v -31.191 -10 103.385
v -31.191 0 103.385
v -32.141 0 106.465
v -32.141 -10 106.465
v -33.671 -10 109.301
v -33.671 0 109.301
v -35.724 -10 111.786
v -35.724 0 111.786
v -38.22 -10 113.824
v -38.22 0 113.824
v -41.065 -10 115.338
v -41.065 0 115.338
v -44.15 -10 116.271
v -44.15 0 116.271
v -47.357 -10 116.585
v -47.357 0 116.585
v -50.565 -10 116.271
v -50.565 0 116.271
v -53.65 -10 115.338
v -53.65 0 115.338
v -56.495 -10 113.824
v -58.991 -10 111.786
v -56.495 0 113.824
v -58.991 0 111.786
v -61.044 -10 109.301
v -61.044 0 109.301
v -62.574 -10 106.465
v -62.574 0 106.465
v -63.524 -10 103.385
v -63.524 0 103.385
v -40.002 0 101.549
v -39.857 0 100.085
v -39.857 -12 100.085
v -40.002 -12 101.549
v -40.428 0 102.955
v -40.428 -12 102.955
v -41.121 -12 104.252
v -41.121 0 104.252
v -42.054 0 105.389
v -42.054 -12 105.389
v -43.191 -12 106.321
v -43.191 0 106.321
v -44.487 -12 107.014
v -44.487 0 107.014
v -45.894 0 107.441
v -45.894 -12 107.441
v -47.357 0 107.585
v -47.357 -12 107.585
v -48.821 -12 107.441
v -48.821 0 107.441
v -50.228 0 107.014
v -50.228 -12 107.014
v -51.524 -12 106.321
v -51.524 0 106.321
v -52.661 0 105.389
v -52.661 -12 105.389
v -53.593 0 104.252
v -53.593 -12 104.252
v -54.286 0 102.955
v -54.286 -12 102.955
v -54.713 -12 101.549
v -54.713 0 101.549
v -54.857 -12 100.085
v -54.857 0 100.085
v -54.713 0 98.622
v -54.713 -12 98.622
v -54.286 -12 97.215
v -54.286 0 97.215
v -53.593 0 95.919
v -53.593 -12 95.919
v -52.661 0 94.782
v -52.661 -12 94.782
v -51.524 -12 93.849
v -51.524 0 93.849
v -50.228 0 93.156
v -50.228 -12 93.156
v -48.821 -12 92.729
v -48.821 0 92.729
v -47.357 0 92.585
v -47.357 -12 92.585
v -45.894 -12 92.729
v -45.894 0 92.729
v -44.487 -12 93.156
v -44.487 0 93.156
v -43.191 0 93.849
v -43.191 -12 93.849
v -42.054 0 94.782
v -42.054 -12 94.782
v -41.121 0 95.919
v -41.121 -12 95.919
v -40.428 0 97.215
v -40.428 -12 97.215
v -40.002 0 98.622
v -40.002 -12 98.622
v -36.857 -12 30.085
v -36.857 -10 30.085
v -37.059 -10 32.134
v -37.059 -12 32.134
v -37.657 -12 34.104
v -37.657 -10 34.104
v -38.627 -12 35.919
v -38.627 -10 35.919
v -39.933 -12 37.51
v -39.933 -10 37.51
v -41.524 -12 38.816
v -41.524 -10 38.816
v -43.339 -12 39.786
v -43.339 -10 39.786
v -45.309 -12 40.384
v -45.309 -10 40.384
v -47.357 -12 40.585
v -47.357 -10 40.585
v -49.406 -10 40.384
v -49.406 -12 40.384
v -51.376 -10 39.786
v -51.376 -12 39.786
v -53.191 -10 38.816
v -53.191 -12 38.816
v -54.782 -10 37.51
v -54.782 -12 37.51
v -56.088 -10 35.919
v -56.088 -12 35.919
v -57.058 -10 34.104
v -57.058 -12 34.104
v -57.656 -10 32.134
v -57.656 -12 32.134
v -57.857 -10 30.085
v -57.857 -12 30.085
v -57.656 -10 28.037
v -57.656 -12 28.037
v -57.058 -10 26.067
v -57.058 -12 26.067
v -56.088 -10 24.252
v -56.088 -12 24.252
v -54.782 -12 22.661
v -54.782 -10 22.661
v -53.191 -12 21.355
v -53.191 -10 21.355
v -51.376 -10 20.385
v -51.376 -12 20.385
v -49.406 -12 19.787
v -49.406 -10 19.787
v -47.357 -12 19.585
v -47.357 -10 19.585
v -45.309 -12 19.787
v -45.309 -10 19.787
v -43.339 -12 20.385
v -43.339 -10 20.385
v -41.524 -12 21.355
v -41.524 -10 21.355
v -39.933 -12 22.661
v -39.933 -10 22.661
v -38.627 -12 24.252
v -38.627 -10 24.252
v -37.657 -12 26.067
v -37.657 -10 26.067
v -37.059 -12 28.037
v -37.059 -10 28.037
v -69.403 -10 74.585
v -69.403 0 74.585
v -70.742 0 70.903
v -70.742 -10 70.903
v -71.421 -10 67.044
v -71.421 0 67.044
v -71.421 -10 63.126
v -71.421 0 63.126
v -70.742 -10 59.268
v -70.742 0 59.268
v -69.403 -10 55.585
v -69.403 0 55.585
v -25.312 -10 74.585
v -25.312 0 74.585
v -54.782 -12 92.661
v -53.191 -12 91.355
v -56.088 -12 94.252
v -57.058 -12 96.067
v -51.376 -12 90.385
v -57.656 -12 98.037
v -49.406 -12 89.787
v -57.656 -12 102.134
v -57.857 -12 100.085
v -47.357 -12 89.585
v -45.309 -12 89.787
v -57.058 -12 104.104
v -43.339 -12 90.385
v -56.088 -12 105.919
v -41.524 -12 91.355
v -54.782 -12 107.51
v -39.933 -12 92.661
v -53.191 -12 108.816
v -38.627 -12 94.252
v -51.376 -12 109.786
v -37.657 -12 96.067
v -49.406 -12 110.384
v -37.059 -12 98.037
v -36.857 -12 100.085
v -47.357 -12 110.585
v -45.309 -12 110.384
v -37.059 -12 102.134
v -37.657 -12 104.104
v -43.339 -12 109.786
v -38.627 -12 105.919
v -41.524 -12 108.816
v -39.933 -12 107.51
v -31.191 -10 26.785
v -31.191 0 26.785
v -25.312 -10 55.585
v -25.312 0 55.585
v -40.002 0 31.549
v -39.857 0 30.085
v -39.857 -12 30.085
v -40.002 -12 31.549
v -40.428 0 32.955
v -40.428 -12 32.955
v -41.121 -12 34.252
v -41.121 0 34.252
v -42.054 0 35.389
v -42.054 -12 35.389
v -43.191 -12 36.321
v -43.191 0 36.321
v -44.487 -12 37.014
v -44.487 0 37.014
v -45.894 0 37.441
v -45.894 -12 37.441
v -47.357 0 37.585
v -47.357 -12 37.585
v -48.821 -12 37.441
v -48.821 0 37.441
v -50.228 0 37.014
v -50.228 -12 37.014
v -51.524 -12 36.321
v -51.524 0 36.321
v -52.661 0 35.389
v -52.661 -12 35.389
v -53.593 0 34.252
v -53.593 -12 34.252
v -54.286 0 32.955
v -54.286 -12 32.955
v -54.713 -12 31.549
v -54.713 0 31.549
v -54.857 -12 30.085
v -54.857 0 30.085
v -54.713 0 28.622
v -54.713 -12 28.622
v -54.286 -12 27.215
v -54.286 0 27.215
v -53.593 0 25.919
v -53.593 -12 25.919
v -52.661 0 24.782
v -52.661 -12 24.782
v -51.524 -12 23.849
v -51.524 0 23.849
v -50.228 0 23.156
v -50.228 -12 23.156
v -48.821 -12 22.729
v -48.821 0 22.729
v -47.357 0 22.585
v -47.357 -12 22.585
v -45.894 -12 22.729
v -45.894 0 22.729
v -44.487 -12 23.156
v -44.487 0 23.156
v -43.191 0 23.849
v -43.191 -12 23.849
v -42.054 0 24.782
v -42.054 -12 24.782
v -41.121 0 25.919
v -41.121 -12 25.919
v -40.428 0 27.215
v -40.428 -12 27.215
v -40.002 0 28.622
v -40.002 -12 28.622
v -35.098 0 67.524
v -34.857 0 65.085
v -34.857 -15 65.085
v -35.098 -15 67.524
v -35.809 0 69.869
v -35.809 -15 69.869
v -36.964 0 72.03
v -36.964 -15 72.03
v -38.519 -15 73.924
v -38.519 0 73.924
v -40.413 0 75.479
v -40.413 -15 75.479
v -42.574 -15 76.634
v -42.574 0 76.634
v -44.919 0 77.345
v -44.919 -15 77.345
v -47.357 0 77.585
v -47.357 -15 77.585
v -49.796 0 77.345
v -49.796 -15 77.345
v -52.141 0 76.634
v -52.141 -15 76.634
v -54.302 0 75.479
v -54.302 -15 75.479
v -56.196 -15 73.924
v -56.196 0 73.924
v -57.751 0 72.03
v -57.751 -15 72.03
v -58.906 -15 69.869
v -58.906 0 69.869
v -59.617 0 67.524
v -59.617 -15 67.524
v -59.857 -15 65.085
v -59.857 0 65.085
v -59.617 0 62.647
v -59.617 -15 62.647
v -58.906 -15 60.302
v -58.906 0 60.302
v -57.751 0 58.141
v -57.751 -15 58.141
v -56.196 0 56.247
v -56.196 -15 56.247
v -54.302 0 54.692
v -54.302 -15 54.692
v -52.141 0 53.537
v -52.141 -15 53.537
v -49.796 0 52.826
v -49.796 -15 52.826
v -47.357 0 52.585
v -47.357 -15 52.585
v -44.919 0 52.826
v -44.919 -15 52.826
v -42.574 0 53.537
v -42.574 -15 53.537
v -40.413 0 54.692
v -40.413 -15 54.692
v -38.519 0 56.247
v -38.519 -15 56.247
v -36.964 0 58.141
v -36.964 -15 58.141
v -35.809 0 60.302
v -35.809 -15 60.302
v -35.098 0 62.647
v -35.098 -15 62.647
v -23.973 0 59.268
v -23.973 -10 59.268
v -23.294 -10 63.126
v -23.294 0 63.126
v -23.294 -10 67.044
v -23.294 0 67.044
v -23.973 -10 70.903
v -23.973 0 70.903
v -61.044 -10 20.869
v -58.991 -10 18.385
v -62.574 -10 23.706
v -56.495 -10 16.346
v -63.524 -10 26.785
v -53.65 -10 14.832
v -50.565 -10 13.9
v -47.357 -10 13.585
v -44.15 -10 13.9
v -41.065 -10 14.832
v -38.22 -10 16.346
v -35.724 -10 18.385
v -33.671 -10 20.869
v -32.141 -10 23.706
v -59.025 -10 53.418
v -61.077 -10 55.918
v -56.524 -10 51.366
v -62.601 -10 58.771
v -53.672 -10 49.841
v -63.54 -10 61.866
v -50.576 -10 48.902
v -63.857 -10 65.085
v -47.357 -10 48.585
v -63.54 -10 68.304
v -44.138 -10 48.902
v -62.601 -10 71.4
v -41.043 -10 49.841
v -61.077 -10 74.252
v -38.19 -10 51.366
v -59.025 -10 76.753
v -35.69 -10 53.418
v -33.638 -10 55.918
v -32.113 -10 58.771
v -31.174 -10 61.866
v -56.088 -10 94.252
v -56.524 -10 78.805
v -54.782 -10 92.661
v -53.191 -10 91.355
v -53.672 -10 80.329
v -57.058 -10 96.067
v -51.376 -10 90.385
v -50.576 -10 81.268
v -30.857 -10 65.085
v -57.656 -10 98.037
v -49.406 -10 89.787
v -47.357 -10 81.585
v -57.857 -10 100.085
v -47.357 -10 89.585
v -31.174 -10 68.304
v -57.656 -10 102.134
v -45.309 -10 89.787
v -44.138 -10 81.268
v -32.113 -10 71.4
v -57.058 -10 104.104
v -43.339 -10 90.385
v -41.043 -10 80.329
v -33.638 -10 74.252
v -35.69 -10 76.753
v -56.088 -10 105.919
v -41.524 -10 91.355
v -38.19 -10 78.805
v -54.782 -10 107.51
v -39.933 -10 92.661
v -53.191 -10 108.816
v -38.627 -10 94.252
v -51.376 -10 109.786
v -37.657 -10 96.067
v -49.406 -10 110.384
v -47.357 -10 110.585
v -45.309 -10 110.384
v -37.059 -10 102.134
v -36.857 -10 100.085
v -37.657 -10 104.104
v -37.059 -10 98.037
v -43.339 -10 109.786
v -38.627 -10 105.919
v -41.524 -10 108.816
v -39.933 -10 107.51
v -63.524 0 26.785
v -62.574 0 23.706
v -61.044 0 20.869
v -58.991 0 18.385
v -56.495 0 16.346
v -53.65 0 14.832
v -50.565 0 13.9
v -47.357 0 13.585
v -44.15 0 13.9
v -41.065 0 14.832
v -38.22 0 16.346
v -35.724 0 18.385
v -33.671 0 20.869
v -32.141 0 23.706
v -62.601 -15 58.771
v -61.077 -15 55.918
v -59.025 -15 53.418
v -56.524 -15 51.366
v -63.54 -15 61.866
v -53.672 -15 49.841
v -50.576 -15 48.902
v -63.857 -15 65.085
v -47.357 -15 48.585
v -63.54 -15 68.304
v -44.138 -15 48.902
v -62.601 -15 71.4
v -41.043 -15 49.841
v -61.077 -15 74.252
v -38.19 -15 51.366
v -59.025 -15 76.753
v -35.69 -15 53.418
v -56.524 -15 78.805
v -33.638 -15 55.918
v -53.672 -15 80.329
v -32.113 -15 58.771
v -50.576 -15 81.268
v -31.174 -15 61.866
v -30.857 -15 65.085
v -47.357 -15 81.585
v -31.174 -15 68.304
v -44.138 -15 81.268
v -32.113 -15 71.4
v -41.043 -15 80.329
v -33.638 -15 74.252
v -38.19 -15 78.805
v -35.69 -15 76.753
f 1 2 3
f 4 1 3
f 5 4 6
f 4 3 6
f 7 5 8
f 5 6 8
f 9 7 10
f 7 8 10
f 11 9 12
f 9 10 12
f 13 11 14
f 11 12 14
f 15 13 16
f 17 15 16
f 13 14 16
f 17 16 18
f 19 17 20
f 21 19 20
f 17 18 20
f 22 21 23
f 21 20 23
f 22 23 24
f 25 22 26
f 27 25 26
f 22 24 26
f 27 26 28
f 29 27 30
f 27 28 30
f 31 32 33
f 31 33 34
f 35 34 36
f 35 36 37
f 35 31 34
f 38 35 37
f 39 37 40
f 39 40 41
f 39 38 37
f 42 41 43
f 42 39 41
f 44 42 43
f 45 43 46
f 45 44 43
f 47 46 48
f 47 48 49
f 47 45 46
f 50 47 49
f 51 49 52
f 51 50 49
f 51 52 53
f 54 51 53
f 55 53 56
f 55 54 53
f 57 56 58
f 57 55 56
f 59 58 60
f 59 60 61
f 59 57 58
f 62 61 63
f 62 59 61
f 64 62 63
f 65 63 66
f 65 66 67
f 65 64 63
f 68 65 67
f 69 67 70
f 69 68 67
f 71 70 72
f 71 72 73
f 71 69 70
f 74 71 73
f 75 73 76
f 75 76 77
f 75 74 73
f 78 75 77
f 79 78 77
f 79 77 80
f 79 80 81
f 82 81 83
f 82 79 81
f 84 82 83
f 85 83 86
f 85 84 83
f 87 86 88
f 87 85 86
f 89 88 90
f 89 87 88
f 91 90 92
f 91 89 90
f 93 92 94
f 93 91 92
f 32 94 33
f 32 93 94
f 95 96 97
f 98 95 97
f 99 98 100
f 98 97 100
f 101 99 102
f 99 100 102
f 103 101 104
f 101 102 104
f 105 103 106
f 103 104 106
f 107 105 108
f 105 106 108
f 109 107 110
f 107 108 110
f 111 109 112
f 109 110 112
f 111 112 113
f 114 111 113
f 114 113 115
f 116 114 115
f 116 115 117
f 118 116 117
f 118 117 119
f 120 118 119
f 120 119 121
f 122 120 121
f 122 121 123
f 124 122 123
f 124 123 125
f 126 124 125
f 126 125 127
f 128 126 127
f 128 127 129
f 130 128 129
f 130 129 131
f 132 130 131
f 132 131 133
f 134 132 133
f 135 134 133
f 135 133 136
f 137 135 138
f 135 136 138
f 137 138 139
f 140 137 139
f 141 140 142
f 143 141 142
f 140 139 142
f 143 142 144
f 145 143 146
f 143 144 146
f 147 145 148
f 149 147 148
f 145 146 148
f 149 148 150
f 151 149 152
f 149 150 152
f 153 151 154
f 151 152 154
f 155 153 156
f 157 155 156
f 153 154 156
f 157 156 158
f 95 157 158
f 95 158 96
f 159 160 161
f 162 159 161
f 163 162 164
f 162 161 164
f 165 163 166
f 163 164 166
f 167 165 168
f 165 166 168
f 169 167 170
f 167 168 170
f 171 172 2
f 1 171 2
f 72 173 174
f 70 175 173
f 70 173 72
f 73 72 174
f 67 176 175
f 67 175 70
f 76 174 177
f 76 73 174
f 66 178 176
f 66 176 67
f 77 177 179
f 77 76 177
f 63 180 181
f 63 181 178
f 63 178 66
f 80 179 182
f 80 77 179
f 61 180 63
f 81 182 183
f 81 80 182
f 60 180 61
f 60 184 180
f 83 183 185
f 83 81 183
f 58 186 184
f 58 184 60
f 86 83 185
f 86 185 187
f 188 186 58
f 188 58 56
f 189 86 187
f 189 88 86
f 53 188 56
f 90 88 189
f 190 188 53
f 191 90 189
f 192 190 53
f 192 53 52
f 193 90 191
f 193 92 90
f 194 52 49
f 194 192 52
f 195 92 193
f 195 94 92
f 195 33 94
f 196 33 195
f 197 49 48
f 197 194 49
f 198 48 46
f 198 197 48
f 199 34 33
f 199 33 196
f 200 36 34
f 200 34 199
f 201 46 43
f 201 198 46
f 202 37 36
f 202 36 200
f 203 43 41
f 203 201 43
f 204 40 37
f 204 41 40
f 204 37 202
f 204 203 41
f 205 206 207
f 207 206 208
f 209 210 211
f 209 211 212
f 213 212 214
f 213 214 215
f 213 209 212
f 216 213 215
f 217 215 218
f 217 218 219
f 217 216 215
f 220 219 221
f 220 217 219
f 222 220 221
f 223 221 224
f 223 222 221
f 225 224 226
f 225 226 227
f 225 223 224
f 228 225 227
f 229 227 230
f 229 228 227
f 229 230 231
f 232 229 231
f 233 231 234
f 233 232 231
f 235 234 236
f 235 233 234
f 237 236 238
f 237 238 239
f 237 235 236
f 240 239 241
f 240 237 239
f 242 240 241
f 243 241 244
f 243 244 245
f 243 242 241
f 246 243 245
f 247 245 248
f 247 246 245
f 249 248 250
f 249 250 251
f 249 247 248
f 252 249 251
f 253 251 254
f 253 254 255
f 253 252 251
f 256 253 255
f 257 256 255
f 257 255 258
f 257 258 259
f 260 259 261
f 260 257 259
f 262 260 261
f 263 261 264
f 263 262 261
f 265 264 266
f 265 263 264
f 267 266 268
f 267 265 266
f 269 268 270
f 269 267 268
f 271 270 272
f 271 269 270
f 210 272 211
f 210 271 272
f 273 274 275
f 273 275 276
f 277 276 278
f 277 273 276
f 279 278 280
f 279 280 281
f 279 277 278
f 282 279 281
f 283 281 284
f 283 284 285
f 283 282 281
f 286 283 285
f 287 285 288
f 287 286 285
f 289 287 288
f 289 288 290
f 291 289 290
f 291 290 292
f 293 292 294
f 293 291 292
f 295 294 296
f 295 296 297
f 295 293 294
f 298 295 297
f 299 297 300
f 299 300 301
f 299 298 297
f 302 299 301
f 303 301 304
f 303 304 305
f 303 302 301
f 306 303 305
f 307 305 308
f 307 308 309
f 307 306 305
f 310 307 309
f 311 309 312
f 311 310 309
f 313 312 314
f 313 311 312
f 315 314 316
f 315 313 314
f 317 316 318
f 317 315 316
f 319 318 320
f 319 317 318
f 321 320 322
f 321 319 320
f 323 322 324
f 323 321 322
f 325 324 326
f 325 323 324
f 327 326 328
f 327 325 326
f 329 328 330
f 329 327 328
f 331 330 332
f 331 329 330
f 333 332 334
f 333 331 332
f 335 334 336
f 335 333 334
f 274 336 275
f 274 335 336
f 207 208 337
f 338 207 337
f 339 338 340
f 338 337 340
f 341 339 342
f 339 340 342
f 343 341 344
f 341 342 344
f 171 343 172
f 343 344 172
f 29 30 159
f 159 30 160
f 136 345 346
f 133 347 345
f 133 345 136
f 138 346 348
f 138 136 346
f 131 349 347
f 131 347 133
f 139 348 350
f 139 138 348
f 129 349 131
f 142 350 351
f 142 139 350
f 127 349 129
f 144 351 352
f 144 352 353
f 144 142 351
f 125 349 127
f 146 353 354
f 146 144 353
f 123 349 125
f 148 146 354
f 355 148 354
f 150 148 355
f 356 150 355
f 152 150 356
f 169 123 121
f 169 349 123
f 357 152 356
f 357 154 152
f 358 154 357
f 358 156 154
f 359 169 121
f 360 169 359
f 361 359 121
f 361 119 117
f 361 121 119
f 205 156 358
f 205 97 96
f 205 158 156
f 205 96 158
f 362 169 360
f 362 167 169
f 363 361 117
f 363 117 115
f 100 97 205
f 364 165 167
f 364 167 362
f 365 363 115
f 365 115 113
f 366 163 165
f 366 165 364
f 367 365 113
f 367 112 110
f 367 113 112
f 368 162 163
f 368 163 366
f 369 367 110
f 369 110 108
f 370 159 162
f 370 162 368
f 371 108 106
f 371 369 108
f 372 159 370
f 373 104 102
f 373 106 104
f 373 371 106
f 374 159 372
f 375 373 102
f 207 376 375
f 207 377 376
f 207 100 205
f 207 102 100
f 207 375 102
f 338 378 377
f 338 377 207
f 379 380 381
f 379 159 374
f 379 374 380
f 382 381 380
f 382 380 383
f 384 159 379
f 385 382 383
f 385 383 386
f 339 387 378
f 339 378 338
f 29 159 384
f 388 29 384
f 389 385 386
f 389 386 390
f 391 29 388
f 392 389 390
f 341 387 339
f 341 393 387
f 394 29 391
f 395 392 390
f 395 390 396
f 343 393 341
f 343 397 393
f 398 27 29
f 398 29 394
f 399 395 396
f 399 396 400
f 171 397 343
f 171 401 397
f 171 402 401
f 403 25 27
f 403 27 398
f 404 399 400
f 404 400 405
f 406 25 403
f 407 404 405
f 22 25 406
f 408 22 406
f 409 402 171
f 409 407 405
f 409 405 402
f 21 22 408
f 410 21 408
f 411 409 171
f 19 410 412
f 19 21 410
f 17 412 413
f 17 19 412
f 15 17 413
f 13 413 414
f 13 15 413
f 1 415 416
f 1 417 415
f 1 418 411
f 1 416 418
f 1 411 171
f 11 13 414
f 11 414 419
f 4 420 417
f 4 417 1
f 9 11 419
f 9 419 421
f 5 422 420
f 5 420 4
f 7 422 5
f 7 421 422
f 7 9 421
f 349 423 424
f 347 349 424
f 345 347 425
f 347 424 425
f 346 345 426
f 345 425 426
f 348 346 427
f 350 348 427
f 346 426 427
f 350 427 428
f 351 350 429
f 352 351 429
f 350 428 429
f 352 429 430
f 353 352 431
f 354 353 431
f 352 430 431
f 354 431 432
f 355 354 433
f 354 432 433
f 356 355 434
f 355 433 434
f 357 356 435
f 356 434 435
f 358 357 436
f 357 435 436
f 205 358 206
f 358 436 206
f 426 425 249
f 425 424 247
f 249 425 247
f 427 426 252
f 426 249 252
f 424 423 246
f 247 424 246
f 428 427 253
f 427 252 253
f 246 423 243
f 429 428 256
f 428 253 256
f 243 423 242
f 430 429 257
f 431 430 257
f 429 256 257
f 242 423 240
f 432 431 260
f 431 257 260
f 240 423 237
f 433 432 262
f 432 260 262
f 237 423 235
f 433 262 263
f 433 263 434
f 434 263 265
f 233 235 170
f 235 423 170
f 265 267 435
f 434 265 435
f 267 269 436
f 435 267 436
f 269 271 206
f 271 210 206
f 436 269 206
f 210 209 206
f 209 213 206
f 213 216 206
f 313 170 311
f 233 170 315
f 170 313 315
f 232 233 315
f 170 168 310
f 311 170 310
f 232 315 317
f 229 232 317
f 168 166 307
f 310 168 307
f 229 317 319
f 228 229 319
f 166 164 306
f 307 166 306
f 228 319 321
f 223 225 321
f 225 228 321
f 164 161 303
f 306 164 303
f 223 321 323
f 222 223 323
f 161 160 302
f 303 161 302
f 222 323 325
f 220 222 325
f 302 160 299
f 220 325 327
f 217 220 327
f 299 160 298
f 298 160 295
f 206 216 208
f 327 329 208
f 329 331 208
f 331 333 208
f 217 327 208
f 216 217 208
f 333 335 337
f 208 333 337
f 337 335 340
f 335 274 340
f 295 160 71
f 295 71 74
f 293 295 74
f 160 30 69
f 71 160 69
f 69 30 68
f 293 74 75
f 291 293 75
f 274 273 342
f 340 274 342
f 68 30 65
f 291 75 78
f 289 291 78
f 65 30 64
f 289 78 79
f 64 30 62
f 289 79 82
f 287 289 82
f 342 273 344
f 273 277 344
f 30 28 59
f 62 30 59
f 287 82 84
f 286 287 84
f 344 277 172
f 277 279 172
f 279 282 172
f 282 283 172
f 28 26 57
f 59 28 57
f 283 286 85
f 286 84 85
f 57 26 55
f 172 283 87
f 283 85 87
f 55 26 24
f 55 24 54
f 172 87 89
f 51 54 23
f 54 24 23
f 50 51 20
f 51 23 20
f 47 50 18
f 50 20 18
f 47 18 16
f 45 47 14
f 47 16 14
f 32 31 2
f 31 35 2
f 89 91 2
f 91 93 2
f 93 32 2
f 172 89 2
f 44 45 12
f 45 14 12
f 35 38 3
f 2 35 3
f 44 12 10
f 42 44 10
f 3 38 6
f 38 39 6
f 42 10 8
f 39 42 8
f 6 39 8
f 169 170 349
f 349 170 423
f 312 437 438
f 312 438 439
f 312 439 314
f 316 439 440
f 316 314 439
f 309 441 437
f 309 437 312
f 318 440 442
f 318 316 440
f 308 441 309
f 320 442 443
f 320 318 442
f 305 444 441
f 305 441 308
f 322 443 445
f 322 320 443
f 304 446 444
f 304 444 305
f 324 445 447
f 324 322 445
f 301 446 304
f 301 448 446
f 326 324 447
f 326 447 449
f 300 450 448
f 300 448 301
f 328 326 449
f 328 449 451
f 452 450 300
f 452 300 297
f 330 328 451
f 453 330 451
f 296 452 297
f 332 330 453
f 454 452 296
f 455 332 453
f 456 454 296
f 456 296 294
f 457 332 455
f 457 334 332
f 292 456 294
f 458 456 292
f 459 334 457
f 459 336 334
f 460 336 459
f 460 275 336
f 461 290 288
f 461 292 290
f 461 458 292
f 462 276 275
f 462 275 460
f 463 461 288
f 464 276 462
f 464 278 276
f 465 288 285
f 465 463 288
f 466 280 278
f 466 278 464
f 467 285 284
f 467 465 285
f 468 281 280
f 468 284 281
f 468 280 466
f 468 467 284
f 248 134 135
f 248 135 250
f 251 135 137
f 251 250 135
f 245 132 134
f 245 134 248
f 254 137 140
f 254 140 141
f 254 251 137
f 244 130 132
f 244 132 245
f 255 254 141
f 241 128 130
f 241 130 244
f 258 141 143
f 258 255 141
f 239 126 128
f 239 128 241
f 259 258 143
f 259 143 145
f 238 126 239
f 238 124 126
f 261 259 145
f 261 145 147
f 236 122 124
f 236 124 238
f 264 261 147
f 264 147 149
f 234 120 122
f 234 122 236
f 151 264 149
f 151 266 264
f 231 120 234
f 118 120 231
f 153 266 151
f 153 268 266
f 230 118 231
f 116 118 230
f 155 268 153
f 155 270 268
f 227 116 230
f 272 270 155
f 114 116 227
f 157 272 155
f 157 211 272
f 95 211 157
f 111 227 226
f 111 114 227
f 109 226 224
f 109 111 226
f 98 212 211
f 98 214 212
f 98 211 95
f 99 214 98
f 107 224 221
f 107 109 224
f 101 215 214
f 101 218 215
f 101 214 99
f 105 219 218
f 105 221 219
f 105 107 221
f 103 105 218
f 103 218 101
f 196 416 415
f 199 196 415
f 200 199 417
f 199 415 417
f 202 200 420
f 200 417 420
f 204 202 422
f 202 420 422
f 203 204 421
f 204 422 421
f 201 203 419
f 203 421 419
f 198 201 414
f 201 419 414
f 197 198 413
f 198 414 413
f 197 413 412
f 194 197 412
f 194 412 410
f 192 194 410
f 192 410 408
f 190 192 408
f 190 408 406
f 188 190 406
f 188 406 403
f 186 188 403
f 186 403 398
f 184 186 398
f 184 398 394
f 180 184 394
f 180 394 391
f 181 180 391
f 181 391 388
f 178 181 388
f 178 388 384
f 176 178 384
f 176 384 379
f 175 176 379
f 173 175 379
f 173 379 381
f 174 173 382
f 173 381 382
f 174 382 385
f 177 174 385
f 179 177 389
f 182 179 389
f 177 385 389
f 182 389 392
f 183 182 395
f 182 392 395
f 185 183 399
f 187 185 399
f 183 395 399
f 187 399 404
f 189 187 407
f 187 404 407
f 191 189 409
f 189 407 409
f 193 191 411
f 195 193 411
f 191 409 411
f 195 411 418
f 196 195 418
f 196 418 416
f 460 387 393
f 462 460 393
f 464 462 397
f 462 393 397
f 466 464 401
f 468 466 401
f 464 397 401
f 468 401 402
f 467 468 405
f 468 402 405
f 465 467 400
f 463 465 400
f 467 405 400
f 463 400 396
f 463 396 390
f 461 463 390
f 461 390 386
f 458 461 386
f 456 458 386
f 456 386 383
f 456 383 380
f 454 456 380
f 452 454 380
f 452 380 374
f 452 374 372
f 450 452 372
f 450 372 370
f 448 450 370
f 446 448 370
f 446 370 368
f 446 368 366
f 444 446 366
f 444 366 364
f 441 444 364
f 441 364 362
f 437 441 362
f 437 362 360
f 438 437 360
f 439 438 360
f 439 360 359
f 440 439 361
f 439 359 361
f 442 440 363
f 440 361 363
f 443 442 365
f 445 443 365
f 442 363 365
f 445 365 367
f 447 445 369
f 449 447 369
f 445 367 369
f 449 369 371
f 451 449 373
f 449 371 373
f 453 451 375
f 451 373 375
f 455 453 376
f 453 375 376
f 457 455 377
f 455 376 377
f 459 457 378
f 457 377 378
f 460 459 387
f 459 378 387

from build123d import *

# Parameters (mm, degrees)
F0_R     = 16.5
F0_R_2   = 12.5
F1_DEPTH = 15
F0_R_3   = 10.5
F2_DEPTH = 10
F0_R_4   = 7.5
F3_DEPTH = 12


with BuildPart() as f1:
    # F0 (on Front) → F1 (new body)
    with BuildSketch(Plane.XZ):
        with Locations((-47.357392, 65.085371)):
            Circle(F0_R)
        with Locations((-47.357392, 65.085371)):
            Circle(F0_R_2, mode=Mode.SUBTRACT)
    extrude(amount=F1_DEPTH)

    # F0 (on Front) → F2 (join)
    with BuildSketch(Plane.XZ):
        with BuildLine():
            Line((-25.311984, 74.585371), (-31.190759, 103.385371))
            ThreePointArc((-31.190759, 103.385371), (-47.357392, 116.585371), (-63.524024, 103.385371))
            Line((-63.524024, 103.385371), (-69.402799, 74.585371))
            ThreePointArc((-69.402799, 74.585371), (-71.506721, 65.085371), (-69.402799, 55.585371))
            Line((-69.402799, 55.585371), (-63.524024, 26.785371))
            ThreePointArc((-63.524024, 26.785371), (-47.357392, 13.585371), (-31.190759, 26.785371))
            Line((-31.190759, 26.785371), (-25.311984, 55.585371))
            ThreePointArc((-25.311984, 55.585371), (-23.208062, 65.085371), (-25.311984, 74.585371))
        make_face()
        with Locations((-47.357392, 30.085371)):
            Circle(F0_R_3, mode=Mode.SUBTRACT)
        with Locations((-47.357392, 65.085371)):
            Circle(F0_R, mode=Mode.SUBTRACT)
        with Locations((-47.357392, 100.085371)):
            Circle(F0_R_3, mode=Mode.SUBTRACT)
    extrude(amount=F2_DEPTH)

    # F0 (on Front) → F3 (join)
    with BuildSketch(Plane.XZ):
        with Locations((-47.357392, 100.085371)):
            Circle(F0_R_3)
        with Locations((-47.357392, 100.085371)):
            Circle(F0_R_4, mode=Mode.SUBTRACT)
        with Locations((-47.357392, 30.085371)):
            Circle(F0_R_3)
        with Locations((-47.357392, 30.085371)):
            Circle(F0_R_4, mode=Mode.SUBTRACT)
    extrude(amount=F3_DEPTH)


solid = f1.part
